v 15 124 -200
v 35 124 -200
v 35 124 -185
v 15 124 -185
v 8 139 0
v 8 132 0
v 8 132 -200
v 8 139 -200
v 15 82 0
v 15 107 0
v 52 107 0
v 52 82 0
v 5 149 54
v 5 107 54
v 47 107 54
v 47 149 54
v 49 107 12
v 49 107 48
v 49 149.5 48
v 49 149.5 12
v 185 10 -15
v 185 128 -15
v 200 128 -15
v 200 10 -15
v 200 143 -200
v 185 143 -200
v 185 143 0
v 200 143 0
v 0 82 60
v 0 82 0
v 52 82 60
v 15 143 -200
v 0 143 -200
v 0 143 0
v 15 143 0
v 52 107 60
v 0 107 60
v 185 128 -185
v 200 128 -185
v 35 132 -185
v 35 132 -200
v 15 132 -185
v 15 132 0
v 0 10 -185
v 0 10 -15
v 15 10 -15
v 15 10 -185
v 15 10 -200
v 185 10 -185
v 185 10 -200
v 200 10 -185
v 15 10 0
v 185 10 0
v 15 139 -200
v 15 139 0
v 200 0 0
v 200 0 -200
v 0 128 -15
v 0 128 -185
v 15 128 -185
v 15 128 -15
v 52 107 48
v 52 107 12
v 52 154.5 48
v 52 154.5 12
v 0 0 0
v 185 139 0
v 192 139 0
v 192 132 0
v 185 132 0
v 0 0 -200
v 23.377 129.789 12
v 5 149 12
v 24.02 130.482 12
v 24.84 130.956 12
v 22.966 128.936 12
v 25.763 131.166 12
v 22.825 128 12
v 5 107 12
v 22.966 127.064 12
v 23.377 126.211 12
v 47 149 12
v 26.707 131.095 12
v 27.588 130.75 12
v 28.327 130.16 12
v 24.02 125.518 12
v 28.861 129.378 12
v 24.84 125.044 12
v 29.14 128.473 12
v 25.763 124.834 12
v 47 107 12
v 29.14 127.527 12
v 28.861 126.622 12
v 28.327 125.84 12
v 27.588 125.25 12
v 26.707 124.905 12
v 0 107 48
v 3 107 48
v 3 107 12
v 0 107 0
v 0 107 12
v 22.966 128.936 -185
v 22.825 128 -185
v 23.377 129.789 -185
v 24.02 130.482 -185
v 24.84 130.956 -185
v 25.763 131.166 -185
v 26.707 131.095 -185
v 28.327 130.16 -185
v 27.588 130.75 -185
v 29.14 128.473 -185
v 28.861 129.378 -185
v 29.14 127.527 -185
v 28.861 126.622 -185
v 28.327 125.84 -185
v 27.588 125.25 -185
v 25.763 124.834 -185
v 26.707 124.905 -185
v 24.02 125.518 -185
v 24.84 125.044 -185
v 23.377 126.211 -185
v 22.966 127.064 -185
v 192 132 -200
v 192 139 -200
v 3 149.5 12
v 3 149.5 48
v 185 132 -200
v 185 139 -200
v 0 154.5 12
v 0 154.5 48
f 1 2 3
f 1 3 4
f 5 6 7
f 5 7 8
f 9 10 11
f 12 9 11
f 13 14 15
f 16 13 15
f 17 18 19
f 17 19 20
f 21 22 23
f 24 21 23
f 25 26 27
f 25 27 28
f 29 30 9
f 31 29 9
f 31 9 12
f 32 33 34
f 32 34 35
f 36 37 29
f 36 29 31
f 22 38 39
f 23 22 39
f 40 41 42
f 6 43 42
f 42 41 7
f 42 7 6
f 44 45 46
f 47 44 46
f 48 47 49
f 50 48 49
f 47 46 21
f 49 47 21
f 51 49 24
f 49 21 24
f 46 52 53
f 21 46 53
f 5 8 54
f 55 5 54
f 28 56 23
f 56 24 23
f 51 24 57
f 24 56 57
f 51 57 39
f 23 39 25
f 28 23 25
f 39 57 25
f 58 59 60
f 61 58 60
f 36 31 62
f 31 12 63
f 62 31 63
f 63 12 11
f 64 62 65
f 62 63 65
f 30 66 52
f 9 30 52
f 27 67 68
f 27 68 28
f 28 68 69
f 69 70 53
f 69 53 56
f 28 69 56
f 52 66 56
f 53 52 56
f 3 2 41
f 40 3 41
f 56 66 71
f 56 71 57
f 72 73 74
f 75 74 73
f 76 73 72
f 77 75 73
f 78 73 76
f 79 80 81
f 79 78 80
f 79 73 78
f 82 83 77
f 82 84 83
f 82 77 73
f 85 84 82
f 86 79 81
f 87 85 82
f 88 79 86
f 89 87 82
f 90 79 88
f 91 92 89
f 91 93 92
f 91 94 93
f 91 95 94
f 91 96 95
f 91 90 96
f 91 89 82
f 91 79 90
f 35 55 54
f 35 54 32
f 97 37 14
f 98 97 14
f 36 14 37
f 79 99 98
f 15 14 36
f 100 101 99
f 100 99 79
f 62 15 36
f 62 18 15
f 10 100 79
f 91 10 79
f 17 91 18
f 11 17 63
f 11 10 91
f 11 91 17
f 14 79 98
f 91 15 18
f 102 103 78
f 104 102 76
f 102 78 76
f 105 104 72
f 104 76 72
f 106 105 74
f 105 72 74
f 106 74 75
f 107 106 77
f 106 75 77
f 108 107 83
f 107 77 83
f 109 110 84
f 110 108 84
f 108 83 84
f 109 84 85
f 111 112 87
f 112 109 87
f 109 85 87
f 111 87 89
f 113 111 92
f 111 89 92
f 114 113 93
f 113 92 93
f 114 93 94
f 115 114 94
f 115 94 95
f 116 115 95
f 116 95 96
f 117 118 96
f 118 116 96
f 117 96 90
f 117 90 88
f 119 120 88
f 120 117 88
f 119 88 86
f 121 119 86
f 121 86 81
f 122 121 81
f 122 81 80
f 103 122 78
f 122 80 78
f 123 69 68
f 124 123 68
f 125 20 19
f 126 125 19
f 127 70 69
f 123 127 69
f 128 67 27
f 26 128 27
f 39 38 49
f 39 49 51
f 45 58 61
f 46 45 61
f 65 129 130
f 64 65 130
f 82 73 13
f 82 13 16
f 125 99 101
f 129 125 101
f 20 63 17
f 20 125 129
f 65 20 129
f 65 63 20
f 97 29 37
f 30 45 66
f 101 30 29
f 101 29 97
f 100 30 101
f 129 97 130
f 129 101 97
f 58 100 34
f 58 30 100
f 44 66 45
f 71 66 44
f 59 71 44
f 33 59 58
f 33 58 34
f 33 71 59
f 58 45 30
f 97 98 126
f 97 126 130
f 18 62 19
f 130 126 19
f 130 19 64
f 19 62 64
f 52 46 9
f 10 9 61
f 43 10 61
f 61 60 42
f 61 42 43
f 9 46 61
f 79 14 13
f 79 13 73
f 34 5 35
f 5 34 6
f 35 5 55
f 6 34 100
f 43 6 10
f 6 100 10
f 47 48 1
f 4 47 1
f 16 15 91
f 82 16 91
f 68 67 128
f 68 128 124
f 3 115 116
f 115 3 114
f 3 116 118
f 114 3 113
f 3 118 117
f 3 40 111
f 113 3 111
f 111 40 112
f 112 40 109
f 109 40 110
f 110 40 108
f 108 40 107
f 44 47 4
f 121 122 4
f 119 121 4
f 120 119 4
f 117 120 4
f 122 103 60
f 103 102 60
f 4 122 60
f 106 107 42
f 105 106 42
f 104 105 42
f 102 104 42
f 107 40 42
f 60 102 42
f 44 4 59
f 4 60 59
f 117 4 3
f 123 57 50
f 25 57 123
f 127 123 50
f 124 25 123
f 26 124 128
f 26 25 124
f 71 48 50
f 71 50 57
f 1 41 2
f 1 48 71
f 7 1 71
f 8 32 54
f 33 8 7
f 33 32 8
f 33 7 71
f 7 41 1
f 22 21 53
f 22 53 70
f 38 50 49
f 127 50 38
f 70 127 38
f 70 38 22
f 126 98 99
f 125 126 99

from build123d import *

# Parameters (mm, degrees)
SKETCH_1_W          = 200
SKETCH_1_H          = 10
EXTRUDE_1_DEPTH     = 200
SKETCH_2_W          = 15
SKETCH_2_H          = 15
EXTRUDE_2_DEPTH     = 133
EXTRUDE_3_REACH     = 309.691
SKETCH_6_W          = 15
SKETCH_6_H          = 15
CUT_EXTRUDE_1_REACH = 318.937
SKETCH_7_W          = 7
SKETCH_7_H          = 7
SKETCH_8_W          = 52
SKETCH_8_H          = 25
EXTRUDE_4_DEPTH     = 60
SKETCH_9_W          = 3
SKETCH_9_H          = 36
EXTRUDE_7_DEPTH     = 47.5
SKETCH_12_W         = 42
SKETCH_12_H         = 42
EXTRUDE_8_DEPTH     = 42
EXTRUDE_9_REACH     = 296.4
SKETCH_14_W         = 36
SKETCH_14_H         = 5
SKETCH_15_W         = 20
SKETCH_15_H         = 8
EXTRUDE_10_DEPTH    = 15
EXTRUDE_11_REACH    = 331.87
SKETCH_13_R         = 3.175


with BuildPart() as part:
    # 草图1 → 凸台-拉伸1 (new body)
    with BuildSketch(Plane.XY):
        with Locations((100, 5)):
            Rectangle(SKETCH_1_W, SKETCH_1_H)
    extrude(amount=-EXTRUDE_1_DEPTH)

    # 草图2 → 凸台-拉伸2 (add)
    with BuildSketch(Plane(origin=(0, 10, 0), x_dir=(1, 0, 0), z_dir=(0, 1, 0))):
        with Locations((7.5, 7.5)):
            Rectangle(SKETCH_2_W, SKETCH_2_H)
        with Locations((192.5, 7.5)):
            Rectangle(SKETCH_2_W, SKETCH_2_H)
        with Locations((192.5, 192.5)):
            Rectangle(SKETCH_2_W, SKETCH_2_H)
        with Locations((7.5, 192.5)):
            Rectangle(SKETCH_2_W, SKETCH_2_H)
    extrude(amount=EXTRUDE_2_DEPTH)

    # 草图6 → 凸台-拉伸3 (add, up to next)
    with BuildSketch(Plane.XY.offset(-185), mode=Mode.PRIVATE) as extrude_3_sk1:
        with Locations((7.5, 135.5)):
            Rectangle(SKETCH_6_W, SKETCH_6_H)
    extrude_3_tool1 = extrude(extrude_3_sk1.sketch, amount=EXTRUDE_3_REACH, mode=Mode.PRIVATE) - part.part
    # 草图6 → 凸台-拉伸3 (add, up to next)
    with BuildSketch(Plane.XY.offset(-185), mode=Mode.PRIVATE) as extrude_3_sk2:
        with Locations((192.5, 135.5)):
            Rectangle(SKETCH_6_W, SKETCH_6_H)
    extrude_3_tool2 = extrude(extrude_3_sk2.sketch, amount=EXTRUDE_3_REACH, mode=Mode.PRIVATE) - part.part
    add(extrude_3_tool1.solids().sort_by_distance((7.5, 135.5, -185))[0])
    add(extrude_3_tool2.solids().sort_by_distance((192.5, 135.5, -185))[0])

    # 草图7 → 切除-拉伸1 (cut, up to next)
    with BuildSketch(Plane.XY, mode=Mode.PRIVATE) as cut_extrude_1_sk1:
        with Locations((11.5, 135.5)):
            Rectangle(SKETCH_7_W, SKETCH_7_H)
    cut_extrude_1_tool1 = extrude(cut_extrude_1_sk1.sketch, amount=-CUT_EXTRUDE_1_REACH, mode=Mode.PRIVATE) & part.part
    # 草图7 → 切除-拉伸1 (cut, up to next)
    with BuildSketch(Plane.XY, mode=Mode.PRIVATE) as cut_extrude_1_sk2:
        with Locations((188.5, 135.5)):
            Rectangle(SKETCH_7_W, SKETCH_7_H)
    cut_extrude_1_tool2 = extrude(cut_extrude_1_sk2.sketch, amount=-CUT_EXTRUDE_1_REACH, mode=Mode.PRIVATE) & part.part
    add(cut_extrude_1_tool1.solids().sort_by_distance((11.5, 135.5, 0))[0], mode=Mode.SUBTRACT)
    add(cut_extrude_1_tool2.solids().sort_by_distance((188.5, 135.5, 0))[0], mode=Mode.SUBTRACT)

    # 草图8 → 凸台-拉伸4 (add)
    with BuildSketch(Plane.XY):
        with Locations((26, 94.5)):
            Rectangle(SKETCH_8_W, SKETCH_8_H)
    extrude(amount=EXTRUDE_4_DEPTH)

    # 草图9 → 凸台-拉伸7 (add)
    with BuildSketch(Plane(origin=(0, 107, 0), x_dir=(1, 0, 0), z_dir=(0, 1, 0))):
        with Locations((50.5, -30)):
            Rectangle(SKETCH_9_W, SKETCH_9_H)
        with Locations((1.5, -30)):
            Rectangle(SKETCH_9_W, SKETCH_9_H)
    extrude(amount=EXTRUDE_7_DEPTH)

    # 草图12 → 凸台-拉伸8 (add)
    with BuildSketch(Plane(origin=(0, 107, 0), x_dir=(1, 0, 0), z_dir=(0, 1, 0))):
        with Locations((26, -33)):
            Rectangle(SKETCH_12_W, SKETCH_12_H)
    extrude(amount=EXTRUDE_8_DEPTH)

    # 草图14 → 凸台-拉伸9 (add, up to next)
    with BuildSketch(Plane.ZY.offset(-49), mode=Mode.PRIVATE) as extrude_9_sk1:
        with Locations((30, 152)):
            Rectangle(SKETCH_14_W, SKETCH_14_H)
    extrude_9_tool1 = extrude(extrude_9_sk1.sketch, amount=EXTRUDE_9_REACH, mode=Mode.PRIVATE) - part.part
    add(extrude_9_tool1.solids().sort_by_distance((49, 152, 30))[0])

    # 草图15 → 凸台-拉伸10 (add)
    with BuildSketch(Plane(origin=(0, 0, -200), x_dir=(-1, 0, 0), z_dir=(0, 0, -1))):
        with Locations((-25, 128)):
            Rectangle(SKETCH_15_W, SKETCH_15_H)
    extrude(amount=-EXTRUDE_10_DEPTH)

    # 草图13 → 凸台-拉伸11 (add, up to next)
    with BuildSketch(Plane(origin=(0, 0, 12), x_dir=(-1, 0, 0), z_dir=(0, 0, -1)), mode=Mode.PRIVATE) as extrude_11_sk1:
        with Locations((-26, 128)):
            Circle(SKETCH_13_R)
    extrude_11_tool1 = extrude(extrude_11_sk1.sketch, amount=EXTRUDE_11_REACH, mode=Mode.PRIVATE) - part.part
    add(extrude_11_tool1.solids().sort_by_distance((26, 128, 12))[0])


solid = part.part
